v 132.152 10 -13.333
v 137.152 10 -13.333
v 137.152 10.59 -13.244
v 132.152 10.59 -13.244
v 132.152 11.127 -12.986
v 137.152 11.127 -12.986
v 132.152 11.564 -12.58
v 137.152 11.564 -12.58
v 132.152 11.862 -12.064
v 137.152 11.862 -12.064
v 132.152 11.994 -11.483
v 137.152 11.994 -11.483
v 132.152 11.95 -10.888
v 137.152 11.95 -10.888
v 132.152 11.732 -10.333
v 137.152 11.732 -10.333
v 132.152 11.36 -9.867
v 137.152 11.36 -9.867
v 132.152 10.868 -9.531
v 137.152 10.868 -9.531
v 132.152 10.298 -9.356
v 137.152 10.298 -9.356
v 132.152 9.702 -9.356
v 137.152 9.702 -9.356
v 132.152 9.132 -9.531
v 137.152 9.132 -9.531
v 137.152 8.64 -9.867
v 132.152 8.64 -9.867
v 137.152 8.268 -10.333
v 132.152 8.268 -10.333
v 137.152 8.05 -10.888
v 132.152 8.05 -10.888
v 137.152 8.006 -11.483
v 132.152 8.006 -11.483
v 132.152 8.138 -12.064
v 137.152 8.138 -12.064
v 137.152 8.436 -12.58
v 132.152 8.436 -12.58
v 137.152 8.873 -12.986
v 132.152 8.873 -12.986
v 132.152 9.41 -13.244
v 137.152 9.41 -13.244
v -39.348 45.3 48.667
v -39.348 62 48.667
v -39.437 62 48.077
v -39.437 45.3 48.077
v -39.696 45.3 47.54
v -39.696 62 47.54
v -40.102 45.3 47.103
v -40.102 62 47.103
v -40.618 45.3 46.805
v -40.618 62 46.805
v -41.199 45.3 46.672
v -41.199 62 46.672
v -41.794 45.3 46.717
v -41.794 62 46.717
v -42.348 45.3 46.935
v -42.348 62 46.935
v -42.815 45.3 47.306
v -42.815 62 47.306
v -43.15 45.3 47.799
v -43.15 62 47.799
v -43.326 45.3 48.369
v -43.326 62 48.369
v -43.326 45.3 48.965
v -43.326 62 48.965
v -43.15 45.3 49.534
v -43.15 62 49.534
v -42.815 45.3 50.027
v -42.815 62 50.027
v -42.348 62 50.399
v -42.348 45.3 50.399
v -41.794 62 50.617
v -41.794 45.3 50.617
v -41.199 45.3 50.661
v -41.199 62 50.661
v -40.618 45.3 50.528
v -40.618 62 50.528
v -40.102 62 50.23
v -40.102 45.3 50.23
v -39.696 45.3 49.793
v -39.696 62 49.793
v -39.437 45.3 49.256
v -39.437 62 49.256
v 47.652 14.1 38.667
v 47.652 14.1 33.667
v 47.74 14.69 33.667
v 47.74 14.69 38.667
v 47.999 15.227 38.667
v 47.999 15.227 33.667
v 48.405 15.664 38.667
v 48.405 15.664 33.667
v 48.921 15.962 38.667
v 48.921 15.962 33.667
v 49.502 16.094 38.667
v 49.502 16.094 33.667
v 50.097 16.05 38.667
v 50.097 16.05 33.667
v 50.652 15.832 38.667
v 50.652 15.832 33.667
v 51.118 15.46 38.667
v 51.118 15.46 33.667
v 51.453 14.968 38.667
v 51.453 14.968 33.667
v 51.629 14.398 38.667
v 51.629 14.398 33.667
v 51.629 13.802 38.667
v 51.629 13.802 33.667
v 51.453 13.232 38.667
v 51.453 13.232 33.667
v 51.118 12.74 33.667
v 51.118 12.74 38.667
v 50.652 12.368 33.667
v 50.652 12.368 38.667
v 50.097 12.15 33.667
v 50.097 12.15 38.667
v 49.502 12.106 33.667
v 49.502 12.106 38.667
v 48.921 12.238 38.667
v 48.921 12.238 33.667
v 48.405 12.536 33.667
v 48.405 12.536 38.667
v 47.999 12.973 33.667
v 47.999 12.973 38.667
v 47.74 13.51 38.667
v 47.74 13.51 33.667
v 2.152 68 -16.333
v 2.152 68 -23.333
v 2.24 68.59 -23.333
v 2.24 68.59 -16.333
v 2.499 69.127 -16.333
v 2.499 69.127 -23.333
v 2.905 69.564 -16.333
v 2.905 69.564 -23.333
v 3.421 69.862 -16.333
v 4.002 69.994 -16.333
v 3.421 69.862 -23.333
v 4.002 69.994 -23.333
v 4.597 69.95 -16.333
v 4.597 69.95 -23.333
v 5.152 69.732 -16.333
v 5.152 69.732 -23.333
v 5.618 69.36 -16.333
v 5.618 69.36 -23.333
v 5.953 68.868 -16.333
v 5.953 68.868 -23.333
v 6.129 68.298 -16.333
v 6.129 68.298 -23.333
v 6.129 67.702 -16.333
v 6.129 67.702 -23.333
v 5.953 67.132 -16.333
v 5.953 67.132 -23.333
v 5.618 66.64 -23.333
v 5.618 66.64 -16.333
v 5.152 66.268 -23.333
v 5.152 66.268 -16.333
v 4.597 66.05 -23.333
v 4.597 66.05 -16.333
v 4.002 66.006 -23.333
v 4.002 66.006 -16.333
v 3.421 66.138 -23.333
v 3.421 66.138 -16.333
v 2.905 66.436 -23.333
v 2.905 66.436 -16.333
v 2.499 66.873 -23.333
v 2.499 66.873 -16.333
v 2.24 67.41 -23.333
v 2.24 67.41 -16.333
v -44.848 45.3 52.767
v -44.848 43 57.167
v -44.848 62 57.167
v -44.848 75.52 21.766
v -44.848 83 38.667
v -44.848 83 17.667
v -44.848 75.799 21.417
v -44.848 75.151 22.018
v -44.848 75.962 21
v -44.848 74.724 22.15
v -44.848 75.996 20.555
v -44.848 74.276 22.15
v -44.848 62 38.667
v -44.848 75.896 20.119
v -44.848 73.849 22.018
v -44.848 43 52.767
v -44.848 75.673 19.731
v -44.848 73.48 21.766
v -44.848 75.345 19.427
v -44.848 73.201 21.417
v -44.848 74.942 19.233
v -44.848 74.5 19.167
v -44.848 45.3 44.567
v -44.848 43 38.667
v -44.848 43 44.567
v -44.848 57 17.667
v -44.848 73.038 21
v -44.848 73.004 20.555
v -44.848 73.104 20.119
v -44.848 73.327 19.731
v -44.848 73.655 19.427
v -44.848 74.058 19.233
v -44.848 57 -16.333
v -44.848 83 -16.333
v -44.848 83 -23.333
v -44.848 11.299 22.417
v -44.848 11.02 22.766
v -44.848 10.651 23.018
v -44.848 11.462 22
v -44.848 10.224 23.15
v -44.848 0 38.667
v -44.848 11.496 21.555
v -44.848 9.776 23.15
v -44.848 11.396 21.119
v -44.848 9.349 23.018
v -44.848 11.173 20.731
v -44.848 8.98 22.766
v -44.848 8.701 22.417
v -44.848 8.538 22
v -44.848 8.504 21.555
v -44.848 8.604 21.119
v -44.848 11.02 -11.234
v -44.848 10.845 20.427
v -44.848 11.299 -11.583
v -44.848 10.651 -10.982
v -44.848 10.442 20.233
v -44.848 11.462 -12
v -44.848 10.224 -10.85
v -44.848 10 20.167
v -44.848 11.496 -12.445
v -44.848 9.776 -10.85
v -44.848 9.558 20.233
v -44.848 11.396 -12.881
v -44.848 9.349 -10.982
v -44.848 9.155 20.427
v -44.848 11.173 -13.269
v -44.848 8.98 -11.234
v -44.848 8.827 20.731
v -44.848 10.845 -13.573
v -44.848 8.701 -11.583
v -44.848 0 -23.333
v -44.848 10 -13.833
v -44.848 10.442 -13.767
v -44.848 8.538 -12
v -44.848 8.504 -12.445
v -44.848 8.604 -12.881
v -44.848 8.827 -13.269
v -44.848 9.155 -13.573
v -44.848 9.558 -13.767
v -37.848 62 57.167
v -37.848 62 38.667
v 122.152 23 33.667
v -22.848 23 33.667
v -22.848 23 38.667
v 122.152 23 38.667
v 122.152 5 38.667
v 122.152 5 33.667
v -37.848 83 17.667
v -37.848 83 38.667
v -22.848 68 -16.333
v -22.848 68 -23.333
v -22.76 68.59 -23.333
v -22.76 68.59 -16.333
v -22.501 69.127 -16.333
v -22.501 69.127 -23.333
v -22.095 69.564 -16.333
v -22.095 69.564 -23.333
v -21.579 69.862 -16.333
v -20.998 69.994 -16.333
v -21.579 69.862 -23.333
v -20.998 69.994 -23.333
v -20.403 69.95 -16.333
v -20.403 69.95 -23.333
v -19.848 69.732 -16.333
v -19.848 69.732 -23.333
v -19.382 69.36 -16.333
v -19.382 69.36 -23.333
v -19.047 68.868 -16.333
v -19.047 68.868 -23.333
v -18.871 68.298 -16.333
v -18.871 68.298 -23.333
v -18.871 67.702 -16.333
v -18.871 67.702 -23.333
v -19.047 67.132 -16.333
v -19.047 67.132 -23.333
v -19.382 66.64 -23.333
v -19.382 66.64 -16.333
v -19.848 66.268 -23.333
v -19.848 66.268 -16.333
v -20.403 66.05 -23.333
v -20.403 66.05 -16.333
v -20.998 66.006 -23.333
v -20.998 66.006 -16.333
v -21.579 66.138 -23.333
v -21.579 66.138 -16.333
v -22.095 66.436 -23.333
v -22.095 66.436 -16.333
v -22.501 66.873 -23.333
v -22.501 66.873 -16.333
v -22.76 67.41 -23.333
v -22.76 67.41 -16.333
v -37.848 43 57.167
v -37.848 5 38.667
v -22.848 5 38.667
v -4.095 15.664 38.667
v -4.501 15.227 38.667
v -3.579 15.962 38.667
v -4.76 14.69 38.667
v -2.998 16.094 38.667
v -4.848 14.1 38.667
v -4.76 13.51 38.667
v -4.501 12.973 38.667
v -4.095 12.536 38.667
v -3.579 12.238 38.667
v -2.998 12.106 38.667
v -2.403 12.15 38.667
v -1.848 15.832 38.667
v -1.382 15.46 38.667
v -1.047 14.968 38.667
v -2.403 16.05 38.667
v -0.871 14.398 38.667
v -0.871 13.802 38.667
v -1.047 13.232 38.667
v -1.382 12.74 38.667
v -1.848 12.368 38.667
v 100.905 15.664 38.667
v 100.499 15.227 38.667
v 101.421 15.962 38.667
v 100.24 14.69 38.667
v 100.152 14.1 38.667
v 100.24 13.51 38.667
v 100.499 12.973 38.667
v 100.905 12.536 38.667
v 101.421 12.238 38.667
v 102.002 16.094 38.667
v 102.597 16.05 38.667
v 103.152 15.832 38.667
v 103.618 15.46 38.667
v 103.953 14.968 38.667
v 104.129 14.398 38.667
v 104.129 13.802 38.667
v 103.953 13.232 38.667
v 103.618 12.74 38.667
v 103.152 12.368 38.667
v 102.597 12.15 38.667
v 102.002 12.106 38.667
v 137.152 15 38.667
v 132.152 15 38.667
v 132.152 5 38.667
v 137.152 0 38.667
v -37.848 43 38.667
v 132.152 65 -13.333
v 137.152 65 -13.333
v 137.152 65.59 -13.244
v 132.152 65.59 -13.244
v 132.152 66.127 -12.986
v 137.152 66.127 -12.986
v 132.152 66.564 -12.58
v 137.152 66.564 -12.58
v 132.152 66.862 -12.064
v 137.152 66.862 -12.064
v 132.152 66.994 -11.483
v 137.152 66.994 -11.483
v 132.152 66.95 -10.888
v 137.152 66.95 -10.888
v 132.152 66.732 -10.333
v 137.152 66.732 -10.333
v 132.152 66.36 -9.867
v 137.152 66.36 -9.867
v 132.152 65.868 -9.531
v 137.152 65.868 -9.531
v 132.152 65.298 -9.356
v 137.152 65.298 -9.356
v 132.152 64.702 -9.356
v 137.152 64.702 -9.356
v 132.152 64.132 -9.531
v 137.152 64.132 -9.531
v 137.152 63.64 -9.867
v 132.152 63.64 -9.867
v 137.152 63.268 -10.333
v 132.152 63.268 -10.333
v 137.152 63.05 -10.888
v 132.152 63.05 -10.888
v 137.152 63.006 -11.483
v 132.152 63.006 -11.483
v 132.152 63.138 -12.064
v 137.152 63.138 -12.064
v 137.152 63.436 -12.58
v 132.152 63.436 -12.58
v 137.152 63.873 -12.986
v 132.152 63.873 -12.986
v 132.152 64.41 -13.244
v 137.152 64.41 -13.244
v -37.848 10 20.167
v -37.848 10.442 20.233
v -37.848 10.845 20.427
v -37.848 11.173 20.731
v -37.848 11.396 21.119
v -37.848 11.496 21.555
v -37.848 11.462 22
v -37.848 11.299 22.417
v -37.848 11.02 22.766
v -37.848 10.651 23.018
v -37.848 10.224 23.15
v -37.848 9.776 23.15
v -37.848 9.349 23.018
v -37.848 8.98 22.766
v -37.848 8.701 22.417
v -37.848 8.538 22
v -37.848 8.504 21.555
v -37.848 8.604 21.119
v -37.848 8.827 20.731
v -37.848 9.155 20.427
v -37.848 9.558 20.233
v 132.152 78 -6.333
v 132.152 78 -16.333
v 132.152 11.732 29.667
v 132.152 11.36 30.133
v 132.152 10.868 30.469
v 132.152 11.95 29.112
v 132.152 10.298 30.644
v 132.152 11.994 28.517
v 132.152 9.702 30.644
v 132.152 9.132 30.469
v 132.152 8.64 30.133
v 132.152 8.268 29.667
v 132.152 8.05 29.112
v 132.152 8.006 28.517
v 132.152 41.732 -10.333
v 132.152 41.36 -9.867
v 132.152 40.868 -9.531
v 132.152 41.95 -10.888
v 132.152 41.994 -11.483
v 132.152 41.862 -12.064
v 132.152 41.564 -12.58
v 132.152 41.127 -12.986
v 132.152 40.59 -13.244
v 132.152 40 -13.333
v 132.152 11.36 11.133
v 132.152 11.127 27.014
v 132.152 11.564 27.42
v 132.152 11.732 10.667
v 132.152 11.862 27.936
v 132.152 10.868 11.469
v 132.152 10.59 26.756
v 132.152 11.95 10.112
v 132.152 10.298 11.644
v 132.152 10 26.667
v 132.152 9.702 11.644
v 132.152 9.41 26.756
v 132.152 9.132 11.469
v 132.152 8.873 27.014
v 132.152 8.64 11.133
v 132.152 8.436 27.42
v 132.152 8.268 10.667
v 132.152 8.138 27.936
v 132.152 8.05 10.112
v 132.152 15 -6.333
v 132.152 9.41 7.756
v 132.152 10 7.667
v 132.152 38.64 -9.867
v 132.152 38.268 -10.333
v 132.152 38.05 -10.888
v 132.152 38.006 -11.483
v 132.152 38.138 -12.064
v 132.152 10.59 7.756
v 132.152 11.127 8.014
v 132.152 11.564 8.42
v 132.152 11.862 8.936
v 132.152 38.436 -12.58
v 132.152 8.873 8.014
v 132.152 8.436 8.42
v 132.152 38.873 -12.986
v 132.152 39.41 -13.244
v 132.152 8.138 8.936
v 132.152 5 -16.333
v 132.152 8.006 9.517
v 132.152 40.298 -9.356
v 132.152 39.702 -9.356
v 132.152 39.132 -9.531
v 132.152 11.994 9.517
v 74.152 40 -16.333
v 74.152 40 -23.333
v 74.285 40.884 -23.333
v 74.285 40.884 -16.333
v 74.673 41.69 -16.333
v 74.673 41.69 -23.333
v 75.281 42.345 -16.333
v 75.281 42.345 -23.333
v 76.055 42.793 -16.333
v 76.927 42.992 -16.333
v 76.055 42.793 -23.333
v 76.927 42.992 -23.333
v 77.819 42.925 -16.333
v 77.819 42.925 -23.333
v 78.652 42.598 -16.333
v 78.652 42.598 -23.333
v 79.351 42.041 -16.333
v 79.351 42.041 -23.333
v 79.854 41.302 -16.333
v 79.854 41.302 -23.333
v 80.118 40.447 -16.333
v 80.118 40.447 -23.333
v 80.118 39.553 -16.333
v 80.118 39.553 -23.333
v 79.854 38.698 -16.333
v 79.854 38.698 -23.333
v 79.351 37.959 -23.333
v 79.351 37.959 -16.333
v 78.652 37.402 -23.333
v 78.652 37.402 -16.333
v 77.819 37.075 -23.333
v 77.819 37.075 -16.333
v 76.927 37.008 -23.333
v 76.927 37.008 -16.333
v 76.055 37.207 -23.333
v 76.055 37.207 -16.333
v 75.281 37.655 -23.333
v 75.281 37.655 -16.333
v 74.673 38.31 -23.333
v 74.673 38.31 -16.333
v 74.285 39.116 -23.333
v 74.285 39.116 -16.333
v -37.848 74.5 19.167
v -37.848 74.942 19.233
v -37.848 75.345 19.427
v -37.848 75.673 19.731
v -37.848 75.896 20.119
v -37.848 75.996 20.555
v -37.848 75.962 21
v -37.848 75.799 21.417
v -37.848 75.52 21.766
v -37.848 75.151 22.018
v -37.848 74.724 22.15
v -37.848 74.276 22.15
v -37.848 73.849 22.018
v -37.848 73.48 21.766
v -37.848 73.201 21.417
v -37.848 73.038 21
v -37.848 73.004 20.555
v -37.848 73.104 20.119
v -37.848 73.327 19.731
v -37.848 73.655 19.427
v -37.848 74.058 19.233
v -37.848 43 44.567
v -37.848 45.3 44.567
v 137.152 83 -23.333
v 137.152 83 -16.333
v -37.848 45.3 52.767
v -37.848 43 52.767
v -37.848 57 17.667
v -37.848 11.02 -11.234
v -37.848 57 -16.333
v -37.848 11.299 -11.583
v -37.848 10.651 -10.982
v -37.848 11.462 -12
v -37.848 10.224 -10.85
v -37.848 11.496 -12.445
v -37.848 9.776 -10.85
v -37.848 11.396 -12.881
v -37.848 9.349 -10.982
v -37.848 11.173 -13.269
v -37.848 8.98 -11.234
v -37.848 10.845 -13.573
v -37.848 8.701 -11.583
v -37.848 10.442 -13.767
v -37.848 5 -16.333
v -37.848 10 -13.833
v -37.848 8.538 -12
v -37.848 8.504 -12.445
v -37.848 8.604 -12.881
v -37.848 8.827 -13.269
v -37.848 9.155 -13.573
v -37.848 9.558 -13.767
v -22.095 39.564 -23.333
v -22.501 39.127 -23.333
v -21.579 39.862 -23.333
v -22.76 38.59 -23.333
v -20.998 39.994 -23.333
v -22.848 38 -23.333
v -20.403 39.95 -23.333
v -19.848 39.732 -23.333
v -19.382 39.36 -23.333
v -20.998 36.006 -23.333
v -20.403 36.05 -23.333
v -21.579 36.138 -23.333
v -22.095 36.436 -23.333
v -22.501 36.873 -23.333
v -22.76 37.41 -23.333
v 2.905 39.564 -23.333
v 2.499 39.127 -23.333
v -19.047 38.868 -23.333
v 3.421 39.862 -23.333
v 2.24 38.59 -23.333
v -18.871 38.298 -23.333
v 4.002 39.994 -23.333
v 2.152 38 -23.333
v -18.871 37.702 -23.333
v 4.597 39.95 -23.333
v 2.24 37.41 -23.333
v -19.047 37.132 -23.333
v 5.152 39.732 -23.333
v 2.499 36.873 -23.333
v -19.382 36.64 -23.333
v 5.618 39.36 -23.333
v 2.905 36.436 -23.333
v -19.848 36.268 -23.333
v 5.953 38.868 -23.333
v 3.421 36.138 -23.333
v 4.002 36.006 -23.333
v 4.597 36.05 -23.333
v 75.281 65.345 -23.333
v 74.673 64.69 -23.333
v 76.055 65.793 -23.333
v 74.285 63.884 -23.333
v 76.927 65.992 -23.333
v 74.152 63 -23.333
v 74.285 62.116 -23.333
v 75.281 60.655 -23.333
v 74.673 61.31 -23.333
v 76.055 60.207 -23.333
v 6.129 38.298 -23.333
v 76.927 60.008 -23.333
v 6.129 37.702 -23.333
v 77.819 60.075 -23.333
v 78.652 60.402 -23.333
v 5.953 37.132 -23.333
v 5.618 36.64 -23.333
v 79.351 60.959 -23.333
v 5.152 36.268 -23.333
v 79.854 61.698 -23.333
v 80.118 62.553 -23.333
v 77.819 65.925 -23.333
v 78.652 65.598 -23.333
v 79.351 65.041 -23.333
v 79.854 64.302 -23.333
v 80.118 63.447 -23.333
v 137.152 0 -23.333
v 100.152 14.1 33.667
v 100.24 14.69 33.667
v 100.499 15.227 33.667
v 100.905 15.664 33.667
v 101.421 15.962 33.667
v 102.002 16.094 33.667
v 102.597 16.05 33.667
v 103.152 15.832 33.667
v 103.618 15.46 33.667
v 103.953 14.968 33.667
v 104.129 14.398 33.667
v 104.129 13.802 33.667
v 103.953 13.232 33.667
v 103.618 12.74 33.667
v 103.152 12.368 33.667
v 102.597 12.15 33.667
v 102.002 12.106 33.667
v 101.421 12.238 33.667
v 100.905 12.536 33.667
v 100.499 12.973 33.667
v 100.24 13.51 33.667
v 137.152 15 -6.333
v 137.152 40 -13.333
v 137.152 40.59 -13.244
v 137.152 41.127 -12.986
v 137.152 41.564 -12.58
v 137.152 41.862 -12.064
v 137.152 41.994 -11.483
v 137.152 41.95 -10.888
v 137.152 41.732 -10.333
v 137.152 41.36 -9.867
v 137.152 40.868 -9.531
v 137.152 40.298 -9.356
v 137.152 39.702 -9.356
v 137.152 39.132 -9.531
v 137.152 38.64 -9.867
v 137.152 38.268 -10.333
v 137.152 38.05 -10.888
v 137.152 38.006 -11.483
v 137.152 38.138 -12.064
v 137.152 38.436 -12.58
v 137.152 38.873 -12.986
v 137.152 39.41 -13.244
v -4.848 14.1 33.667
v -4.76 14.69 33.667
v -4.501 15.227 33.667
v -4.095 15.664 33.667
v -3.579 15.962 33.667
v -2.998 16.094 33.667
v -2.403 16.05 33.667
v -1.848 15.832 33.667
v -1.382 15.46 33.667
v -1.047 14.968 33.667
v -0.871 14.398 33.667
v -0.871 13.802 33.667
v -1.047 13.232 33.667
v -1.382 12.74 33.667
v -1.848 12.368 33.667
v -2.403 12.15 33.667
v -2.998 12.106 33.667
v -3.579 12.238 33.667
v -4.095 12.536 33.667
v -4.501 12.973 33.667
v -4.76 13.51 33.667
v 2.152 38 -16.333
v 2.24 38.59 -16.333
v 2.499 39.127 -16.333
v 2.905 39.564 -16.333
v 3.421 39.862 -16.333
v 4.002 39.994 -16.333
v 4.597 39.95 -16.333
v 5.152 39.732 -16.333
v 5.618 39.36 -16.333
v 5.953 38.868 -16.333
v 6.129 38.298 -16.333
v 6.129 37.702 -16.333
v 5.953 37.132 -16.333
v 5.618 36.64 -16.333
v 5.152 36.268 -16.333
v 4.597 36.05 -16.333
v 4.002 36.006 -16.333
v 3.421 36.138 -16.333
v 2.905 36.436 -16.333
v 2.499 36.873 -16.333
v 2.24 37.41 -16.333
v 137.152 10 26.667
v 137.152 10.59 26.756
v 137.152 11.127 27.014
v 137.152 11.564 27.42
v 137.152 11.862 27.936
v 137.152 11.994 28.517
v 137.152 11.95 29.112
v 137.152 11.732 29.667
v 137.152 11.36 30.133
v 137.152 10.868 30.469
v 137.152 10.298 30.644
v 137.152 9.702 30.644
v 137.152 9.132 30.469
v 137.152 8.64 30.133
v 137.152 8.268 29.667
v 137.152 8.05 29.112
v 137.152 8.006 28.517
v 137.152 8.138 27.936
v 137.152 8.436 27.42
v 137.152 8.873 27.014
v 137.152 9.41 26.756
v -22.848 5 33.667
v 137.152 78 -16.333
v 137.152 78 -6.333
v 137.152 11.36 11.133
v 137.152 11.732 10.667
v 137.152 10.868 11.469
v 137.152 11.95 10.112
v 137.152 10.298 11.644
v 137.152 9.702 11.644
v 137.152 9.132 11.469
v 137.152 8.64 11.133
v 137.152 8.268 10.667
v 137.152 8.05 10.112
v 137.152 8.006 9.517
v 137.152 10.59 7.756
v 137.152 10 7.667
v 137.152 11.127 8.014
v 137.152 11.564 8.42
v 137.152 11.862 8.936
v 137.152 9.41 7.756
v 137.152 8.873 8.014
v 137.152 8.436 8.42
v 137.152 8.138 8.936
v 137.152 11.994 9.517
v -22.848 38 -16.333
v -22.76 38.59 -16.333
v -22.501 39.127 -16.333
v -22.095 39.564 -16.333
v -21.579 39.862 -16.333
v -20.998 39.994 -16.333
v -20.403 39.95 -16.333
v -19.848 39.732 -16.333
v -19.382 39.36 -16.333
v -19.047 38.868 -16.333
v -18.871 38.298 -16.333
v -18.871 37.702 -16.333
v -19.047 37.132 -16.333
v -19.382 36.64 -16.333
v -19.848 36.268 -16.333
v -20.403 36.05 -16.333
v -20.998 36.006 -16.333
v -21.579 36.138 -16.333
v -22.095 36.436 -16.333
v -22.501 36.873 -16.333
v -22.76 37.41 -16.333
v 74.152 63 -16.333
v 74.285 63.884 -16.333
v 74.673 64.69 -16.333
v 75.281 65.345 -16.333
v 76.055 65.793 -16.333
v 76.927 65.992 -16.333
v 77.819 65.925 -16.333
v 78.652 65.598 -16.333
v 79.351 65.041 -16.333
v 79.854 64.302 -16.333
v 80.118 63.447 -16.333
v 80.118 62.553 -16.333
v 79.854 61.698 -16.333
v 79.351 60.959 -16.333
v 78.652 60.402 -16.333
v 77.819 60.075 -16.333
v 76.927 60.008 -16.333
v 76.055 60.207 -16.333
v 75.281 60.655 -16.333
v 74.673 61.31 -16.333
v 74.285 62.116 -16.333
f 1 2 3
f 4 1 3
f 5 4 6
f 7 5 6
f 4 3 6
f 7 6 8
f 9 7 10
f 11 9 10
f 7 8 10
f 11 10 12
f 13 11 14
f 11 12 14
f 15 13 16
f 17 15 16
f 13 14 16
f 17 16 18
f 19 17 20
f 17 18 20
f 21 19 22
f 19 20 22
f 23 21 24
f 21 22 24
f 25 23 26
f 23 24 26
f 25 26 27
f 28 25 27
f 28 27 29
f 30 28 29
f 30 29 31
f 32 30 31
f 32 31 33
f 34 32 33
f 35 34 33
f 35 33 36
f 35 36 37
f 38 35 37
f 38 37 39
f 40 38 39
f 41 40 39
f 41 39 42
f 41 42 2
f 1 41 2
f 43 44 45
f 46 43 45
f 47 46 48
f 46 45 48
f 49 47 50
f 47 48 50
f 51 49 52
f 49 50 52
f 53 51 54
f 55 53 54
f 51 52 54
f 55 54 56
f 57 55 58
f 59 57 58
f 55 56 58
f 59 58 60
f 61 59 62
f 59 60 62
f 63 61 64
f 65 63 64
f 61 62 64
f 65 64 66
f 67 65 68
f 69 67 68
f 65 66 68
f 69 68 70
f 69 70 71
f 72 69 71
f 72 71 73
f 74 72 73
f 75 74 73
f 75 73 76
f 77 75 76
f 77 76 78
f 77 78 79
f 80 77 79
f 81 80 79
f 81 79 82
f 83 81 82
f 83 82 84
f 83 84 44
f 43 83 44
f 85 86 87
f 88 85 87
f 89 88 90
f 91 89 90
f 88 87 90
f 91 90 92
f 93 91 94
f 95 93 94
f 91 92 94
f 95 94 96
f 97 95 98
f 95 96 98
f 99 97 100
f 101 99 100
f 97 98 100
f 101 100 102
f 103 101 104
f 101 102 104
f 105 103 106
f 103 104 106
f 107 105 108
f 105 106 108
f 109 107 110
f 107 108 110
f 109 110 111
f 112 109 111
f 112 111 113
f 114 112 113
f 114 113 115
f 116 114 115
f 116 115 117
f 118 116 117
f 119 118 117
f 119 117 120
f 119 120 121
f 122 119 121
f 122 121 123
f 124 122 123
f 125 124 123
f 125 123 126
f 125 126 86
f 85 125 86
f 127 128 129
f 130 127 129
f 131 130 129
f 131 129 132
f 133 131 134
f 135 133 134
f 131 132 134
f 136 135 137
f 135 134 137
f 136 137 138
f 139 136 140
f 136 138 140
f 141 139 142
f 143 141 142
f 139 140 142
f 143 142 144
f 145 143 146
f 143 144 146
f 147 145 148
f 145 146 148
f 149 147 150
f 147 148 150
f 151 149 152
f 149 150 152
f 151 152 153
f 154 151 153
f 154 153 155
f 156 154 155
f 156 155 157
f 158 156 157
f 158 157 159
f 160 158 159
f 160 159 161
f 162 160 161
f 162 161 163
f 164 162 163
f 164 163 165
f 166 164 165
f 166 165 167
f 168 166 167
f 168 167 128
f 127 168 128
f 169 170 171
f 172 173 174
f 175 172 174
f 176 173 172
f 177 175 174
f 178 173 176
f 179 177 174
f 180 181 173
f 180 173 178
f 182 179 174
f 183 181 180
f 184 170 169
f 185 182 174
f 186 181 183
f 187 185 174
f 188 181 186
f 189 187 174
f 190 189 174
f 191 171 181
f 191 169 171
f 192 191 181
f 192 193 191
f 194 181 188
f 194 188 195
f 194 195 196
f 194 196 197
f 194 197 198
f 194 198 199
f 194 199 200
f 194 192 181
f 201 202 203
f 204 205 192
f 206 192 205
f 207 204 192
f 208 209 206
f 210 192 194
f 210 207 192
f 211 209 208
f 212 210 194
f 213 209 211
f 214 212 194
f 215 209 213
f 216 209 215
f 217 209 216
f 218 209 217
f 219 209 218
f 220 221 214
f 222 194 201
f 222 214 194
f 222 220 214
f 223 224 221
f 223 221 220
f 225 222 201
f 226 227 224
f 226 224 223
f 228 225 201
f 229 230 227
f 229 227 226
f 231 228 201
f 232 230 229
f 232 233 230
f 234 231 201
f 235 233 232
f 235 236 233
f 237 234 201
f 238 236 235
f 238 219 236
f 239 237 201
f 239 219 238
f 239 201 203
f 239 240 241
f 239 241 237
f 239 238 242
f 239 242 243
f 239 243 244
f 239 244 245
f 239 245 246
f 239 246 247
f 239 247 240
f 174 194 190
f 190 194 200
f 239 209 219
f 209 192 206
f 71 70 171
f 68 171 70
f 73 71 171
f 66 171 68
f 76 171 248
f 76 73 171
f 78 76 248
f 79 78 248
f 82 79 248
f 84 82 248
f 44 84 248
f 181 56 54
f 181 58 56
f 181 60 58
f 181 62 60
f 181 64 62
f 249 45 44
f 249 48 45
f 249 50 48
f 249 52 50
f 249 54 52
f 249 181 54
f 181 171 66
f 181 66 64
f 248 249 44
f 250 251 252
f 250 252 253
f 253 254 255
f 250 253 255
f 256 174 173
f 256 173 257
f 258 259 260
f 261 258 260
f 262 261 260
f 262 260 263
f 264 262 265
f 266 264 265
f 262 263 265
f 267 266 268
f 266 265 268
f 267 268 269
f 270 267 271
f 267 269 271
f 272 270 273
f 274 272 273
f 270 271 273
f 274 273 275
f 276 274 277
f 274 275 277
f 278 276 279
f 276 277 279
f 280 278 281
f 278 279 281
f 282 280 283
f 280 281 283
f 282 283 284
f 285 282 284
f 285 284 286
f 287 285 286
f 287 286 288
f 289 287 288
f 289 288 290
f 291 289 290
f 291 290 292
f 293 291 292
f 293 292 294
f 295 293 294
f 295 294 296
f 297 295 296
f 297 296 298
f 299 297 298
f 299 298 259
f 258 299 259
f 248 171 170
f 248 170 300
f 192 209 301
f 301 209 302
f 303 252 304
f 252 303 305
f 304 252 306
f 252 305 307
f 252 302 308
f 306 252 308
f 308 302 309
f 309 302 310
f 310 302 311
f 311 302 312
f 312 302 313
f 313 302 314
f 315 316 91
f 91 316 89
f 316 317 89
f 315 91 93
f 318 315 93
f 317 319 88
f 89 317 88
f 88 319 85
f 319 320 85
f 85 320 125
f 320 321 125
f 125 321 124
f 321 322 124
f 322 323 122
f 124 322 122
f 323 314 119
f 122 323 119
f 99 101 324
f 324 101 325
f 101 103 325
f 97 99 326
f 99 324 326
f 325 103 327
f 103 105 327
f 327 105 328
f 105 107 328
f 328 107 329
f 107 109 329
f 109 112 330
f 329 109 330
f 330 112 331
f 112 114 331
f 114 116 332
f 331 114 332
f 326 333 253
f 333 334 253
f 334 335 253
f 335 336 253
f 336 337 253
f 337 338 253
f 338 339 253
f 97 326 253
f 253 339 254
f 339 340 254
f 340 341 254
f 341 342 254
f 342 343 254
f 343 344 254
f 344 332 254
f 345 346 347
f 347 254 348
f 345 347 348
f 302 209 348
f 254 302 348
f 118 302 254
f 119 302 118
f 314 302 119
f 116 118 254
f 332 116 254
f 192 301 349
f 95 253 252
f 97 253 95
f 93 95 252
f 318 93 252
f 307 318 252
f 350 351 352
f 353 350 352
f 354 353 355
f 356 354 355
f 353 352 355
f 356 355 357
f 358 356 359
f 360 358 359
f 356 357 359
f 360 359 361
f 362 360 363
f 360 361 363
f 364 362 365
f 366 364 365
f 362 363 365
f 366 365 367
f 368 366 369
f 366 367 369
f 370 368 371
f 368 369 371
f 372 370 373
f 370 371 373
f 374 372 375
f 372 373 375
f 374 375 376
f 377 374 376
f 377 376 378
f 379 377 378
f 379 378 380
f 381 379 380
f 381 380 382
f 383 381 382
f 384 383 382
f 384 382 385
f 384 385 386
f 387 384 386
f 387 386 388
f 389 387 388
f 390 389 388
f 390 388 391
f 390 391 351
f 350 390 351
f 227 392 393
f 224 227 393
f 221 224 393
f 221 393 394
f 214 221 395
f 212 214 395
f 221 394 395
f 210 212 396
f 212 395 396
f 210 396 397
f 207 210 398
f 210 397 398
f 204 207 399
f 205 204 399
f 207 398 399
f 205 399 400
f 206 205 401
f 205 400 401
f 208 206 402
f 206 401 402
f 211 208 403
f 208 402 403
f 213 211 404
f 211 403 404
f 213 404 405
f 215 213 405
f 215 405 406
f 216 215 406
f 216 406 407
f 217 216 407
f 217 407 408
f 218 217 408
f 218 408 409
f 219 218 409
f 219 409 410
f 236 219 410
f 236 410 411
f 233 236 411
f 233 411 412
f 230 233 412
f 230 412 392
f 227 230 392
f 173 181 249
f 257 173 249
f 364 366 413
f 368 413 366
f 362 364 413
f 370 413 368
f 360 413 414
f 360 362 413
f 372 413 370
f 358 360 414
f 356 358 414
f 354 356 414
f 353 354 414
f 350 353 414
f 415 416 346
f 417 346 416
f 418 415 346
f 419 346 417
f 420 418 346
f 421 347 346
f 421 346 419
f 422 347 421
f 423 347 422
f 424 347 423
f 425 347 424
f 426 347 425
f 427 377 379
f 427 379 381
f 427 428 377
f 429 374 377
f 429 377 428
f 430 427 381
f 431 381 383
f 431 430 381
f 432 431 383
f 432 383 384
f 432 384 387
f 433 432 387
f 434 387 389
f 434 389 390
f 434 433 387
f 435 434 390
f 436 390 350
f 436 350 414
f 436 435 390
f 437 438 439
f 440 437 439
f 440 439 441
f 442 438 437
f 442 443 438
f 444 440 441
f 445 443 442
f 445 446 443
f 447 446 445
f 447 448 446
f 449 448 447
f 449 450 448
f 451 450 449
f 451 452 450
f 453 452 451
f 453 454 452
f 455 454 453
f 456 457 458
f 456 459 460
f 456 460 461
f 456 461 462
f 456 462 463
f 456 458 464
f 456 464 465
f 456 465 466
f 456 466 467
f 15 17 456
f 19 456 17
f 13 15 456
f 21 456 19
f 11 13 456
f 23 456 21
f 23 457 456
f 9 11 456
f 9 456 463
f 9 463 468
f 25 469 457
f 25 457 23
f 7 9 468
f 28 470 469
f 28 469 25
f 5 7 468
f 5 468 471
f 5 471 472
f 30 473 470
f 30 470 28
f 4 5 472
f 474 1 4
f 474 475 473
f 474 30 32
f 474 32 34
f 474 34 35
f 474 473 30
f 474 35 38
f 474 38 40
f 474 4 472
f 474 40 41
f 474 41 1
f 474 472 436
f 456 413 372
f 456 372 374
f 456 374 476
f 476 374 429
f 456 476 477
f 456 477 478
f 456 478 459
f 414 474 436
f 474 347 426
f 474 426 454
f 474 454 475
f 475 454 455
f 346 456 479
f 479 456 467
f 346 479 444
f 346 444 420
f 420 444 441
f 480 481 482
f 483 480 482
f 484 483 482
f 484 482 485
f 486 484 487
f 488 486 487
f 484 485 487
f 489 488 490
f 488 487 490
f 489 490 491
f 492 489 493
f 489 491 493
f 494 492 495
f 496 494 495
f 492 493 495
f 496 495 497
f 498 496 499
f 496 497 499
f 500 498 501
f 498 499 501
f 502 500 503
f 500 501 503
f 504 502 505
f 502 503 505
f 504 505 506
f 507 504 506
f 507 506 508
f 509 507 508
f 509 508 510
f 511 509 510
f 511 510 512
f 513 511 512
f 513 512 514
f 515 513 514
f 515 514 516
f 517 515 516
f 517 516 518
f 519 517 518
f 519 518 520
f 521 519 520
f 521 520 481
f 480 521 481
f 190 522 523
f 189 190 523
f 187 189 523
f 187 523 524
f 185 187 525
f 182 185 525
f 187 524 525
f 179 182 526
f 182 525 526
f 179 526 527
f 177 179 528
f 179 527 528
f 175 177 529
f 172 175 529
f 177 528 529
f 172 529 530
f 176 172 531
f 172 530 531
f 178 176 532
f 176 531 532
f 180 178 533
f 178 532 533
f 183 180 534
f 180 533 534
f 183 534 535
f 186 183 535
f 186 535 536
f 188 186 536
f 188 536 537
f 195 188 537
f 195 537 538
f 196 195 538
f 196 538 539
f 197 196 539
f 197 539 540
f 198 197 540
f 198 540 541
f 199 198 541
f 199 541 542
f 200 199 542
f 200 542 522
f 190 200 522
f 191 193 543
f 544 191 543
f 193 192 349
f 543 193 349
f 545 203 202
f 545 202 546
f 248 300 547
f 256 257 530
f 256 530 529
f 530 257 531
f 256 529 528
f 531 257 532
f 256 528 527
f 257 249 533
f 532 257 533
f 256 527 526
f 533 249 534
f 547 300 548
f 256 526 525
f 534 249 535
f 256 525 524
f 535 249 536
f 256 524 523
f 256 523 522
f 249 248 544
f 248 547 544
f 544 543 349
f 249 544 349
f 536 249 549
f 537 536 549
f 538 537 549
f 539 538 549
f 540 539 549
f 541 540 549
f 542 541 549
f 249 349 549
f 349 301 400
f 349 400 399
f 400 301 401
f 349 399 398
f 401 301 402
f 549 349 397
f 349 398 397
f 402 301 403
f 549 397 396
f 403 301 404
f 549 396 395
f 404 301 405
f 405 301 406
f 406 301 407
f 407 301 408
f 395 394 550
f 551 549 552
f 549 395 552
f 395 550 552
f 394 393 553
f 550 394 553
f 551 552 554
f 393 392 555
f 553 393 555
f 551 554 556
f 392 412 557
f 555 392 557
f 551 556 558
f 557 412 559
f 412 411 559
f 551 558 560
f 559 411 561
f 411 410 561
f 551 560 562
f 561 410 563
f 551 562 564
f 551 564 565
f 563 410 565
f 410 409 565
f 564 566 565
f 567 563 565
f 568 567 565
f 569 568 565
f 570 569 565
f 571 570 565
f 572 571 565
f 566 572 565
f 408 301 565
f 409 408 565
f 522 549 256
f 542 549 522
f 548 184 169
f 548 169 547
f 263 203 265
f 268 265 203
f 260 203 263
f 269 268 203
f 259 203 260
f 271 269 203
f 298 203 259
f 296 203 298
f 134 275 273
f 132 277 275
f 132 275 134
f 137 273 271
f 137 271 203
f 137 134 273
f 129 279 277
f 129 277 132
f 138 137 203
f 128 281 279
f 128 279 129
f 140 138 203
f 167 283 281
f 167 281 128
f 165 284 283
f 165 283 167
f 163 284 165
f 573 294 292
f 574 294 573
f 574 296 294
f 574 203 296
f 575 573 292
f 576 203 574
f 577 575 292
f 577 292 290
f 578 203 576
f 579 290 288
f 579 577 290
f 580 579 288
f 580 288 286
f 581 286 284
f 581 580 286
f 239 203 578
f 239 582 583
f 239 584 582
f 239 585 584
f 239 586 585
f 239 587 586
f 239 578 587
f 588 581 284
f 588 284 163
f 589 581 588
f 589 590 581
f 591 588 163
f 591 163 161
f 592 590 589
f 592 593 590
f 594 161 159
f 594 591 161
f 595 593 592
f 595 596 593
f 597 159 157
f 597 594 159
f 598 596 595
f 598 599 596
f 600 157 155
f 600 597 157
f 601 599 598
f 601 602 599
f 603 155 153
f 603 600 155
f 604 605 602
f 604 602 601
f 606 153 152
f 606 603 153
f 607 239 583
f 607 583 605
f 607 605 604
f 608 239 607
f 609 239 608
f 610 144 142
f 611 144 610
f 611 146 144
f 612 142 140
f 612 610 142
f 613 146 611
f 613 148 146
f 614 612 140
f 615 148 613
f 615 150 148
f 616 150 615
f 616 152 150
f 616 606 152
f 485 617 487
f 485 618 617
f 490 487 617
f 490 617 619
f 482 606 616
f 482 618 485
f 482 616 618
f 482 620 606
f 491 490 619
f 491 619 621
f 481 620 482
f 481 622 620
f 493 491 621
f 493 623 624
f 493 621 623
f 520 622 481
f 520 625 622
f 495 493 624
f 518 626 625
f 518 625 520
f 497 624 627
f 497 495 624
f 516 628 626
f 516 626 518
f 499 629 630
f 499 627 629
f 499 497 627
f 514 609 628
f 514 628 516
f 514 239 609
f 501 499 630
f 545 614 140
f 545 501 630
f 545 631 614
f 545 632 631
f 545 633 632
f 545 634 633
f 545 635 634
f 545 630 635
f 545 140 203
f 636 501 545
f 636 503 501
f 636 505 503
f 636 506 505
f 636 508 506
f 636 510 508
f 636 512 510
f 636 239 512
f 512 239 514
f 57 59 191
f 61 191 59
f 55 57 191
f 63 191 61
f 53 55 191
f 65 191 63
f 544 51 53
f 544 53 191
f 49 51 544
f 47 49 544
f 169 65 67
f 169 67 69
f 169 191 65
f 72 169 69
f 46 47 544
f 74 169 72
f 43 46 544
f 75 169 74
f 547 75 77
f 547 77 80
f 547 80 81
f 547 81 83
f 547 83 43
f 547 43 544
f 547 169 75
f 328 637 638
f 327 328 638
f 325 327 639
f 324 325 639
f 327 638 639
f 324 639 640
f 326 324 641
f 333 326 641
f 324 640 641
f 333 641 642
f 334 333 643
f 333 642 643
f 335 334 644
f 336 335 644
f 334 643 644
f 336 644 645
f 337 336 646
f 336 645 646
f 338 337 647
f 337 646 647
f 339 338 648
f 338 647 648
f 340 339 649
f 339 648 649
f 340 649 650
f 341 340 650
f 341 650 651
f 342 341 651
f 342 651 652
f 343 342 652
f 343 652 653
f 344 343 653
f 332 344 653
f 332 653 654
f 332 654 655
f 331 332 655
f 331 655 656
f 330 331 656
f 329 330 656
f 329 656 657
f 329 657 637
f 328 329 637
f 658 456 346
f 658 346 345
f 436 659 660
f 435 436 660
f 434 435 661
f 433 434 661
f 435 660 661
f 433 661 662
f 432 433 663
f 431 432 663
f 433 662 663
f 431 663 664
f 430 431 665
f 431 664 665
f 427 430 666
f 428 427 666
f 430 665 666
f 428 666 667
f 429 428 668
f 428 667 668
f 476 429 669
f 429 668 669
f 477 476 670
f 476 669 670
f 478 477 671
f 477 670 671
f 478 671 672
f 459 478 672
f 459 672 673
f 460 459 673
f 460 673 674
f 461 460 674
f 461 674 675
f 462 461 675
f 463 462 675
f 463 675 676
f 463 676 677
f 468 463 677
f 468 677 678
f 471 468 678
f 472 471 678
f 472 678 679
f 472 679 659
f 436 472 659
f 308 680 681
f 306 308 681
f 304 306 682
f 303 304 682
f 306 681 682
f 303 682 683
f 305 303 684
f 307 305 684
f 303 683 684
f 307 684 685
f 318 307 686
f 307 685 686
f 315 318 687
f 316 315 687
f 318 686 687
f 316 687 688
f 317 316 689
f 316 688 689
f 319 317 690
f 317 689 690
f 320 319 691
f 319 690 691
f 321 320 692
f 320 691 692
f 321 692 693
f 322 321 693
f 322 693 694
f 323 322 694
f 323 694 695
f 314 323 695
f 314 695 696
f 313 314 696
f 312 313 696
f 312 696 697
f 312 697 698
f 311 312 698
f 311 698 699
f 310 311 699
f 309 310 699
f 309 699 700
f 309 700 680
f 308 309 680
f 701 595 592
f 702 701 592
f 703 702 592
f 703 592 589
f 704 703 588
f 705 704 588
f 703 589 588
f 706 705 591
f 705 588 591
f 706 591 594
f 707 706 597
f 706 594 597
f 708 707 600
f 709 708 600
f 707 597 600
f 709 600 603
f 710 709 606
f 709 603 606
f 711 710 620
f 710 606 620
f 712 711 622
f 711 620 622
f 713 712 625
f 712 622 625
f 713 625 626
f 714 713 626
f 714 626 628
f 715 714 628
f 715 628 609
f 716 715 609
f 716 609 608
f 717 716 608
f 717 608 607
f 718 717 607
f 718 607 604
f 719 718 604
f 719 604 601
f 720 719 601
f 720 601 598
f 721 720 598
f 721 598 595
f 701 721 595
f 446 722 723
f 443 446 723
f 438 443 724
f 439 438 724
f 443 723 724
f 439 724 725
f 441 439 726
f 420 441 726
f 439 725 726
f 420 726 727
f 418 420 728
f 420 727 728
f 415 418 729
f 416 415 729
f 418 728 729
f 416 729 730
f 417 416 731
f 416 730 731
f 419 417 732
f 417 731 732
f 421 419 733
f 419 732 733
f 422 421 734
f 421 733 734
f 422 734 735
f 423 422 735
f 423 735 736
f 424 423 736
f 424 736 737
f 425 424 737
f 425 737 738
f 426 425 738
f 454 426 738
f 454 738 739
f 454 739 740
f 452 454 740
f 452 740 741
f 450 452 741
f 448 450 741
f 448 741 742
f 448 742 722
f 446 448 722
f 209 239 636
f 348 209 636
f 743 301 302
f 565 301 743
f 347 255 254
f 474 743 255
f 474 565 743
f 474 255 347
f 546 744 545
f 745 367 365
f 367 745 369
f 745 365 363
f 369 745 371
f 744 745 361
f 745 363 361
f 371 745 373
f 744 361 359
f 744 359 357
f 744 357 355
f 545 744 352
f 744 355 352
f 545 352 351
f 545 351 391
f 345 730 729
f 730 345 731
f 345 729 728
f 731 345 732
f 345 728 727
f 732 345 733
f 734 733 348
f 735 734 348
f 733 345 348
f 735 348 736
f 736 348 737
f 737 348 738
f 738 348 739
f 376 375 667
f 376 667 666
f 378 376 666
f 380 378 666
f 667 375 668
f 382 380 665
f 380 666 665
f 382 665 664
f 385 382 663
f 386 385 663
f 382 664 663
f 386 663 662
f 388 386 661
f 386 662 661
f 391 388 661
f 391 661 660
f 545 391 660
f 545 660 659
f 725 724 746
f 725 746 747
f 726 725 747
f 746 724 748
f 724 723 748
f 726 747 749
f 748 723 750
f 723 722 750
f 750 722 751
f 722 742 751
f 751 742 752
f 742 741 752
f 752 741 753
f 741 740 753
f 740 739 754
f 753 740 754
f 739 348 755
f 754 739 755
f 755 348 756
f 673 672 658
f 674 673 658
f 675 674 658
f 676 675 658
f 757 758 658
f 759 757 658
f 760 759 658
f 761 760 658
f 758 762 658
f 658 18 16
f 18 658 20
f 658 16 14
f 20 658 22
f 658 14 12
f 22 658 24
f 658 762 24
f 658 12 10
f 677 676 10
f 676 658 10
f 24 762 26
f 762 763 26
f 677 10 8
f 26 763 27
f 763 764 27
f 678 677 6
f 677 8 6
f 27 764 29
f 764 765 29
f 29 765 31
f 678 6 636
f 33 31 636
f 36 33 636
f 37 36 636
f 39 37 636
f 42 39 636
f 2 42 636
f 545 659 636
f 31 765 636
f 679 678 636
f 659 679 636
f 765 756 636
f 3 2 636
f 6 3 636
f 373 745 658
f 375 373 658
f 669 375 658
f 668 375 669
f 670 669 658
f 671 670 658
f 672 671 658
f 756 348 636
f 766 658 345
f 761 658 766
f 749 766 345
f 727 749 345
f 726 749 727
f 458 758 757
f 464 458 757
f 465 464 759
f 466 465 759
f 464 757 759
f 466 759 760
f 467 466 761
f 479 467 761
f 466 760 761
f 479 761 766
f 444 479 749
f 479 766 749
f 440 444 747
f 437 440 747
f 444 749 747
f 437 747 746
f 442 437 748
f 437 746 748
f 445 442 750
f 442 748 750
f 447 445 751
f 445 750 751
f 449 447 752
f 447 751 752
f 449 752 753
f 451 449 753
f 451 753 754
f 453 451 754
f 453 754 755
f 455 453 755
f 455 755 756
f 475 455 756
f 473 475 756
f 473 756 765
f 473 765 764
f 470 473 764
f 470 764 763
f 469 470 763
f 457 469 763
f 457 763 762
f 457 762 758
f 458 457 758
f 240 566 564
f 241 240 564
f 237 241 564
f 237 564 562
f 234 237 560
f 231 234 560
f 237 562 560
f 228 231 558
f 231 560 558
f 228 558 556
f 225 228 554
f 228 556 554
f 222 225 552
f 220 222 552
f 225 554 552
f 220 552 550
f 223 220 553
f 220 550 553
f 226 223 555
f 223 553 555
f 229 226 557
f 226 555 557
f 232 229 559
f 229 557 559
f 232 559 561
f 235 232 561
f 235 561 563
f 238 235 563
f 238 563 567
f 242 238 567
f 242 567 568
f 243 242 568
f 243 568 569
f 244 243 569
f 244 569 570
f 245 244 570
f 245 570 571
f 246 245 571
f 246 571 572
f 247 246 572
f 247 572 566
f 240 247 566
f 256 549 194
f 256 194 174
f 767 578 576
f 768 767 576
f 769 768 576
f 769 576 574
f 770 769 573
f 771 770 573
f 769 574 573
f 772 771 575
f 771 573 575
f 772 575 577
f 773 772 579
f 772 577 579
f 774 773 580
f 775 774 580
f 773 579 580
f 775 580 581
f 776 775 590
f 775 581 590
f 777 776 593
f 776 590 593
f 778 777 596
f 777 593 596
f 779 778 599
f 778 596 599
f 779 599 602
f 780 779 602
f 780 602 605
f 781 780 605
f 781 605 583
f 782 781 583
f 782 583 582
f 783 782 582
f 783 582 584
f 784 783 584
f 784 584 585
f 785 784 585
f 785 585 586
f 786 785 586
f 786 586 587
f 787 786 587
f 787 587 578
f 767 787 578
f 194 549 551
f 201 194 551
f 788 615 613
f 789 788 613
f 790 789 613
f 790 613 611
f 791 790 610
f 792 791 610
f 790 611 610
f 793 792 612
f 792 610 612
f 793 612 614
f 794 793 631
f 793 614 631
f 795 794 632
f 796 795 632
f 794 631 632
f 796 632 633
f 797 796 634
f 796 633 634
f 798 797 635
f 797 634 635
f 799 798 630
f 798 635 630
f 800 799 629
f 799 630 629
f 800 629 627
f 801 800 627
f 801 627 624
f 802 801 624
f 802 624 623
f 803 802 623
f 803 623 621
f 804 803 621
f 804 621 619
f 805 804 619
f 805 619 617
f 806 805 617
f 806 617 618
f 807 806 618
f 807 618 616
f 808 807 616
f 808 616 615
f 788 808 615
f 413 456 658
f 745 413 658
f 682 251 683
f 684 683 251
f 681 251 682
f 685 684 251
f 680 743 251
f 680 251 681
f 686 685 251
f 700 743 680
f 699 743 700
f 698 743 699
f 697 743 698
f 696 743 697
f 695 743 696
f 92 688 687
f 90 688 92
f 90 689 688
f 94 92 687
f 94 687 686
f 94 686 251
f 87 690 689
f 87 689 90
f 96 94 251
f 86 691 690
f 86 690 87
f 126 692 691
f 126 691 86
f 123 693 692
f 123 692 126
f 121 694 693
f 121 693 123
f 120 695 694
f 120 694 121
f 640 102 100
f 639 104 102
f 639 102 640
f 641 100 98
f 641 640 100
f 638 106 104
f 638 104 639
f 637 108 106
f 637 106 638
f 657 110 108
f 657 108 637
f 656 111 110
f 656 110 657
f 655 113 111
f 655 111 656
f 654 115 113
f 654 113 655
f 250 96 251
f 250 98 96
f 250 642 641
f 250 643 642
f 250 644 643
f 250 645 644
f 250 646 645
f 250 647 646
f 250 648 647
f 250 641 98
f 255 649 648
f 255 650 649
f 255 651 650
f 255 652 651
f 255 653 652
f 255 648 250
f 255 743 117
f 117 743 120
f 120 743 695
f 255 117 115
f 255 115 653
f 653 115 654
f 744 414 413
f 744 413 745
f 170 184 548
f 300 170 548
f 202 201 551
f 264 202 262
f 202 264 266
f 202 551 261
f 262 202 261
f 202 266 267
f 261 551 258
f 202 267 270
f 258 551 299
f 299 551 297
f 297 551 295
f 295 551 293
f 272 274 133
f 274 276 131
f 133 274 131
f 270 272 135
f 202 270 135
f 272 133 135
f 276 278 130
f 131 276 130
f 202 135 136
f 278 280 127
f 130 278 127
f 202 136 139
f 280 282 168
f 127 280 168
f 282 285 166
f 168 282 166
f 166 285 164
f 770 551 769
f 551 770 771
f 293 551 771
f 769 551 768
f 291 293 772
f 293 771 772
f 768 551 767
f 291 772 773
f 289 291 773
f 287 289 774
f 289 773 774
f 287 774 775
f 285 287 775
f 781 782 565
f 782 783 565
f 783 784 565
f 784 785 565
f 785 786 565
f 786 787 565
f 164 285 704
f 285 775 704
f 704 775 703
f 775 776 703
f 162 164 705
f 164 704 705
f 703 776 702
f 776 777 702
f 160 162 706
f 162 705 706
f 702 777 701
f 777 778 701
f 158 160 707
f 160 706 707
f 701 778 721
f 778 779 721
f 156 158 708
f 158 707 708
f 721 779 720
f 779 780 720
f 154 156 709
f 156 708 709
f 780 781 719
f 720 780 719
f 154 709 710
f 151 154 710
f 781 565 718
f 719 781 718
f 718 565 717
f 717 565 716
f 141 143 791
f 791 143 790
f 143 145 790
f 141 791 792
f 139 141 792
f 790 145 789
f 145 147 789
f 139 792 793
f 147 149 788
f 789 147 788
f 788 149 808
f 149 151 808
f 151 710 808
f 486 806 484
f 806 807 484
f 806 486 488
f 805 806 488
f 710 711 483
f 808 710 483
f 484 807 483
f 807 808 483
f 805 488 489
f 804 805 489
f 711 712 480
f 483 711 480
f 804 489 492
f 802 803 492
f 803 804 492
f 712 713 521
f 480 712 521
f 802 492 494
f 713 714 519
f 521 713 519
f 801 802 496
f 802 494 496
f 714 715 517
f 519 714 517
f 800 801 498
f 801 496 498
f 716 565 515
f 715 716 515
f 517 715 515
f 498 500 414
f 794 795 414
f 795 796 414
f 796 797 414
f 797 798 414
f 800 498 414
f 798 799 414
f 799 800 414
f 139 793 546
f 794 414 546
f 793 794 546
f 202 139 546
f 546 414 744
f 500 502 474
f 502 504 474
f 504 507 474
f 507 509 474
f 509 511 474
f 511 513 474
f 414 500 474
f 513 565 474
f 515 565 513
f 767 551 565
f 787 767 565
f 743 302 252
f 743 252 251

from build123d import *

# Parameters (mm, degrees)
SKETCH1_W           = 182
SKETCH1_H           = 62
BOSS_EXTRUDE1_DEPTH = 5
SKETCH2_W           = 145
SKETCH2_H           = 5
BOSS_EXTRUDE2_DEPTH = 18
SKETCH3_R           = 2
CUT_EXTRUDE1_DEPTH  = 18
SKETCH4_W           = 7
SKETCH4_H           = 62
BOSS_EXTRUDE3_DEPTH = 78
SKETCH5_W           = 175
SKETCH5_H           = 7
BOSS_EXTRUDE4_DEPTH = 78
SKETCH6_W           = 7
SKETCH6_H           = 19
BOSS_EXTRUDE5_DEPTH = 18.5
SKETCH7_R           = 2
CUT_EXTRUDE2_DEPTH  = 18
SKETCH8_W           = 7
SKETCH8_H           = 8.2
CUT_EXTRUDE3_DEPTH  = 2.3
SKETCH11_R          = 1.5
SKETCH11_W          = 34
SKETCH11_H          = 26
CUT_EXTRUDE5_DEPTH  = 10
SKETCH12_W          = 5
SKETCH12_H          = 55
BOSS_EXTRUDE6_DEPTH = 10
SKETCH13_W          = 5
SKETCH13_H          = 10
BOSS_EXTRUDE7_DEPTH = 63
SKETCH15_R          = 2
CUT_EXTRUDE6_DEPTH  = 63
SKETCH16_R          = 3
CUT_EXTRUDE7_DEPTH  = 10
SKETCH17_R          = 2
CUT_EXTRUDE8_DEPTH  = 10
SKETCH18_R          = 1.5
CUT_EXTRUDE9_DEPTH  = 10


with BuildPart() as part:
    # Sketch1 → Boss-Extrude1 (new body)
    with BuildSketch(Plane(origin=(0, 0, 0), x_dir=(1, 0, 0), z_dir=(0, 1, 0))):
        with Locations((46.151515152, -7.666666667)):
            Rectangle(SKETCH1_W, SKETCH1_H)
    extrude(amount=BOSS_EXTRUDE1_DEPTH)

    # Sketch2 → Boss-Extrude2 (add)
    with BuildSketch(Plane(origin=(0, 5, 0), x_dir=(1, 0, 0), z_dir=(0, 1, 0))):
        with Locations((49.651515152, -36.166666667)):
            Rectangle(SKETCH2_W, SKETCH2_H)
    extrude(amount=BOSS_EXTRUDE2_DEPTH)

    # Sketch3 → Cut-Extrude1 (cut)
    with BuildSketch(Plane(origin=(0, 0, 33.666666667), x_dir=(-1, 0, 0), z_dir=(0, 0, -1))):
        with Locations((-102.151515152, 14.1)):
            Circle(SKETCH3_R)
        with Locations((-49.651515152, 14.1)):
            Circle(SKETCH3_R)
        with Locations((2.848484848, 14.1)):
            Circle(SKETCH3_R)
    extrude(amount=-CUT_EXTRUDE1_DEPTH, mode=Mode.SUBTRACT)

    # Sketch4 → Boss-Extrude3 (add)
    with BuildSketch(Plane(origin=(0, 5, 0), x_dir=(1, 0, 0), z_dir=(0, 1, 0))):
        with Locations((-41.348484848, -7.666666667)):
            Rectangle(SKETCH4_W, SKETCH4_H)
    extrude(amount=BOSS_EXTRUDE3_DEPTH)

    # Sketch5 → Boss-Extrude4 (add)
    with BuildSketch(Plane(origin=(0, 5, 0), x_dir=(1, 0, 0), z_dir=(0, 1, 0))):
        with Locations((49.651515152, 19.833333333)):
            Rectangle(SKETCH5_W, SKETCH5_H)
    extrude(amount=BOSS_EXTRUDE4_DEPTH)

    # Sketch6 → Boss-Extrude5 (add)
    with BuildSketch(Plane.XY.offset(38.666666667)):
        with Locations((-41.348484848, 52.5)):
            Rectangle(SKETCH6_W, SKETCH6_H)
    extrude(amount=BOSS_EXTRUDE5_DEPTH)

    # Sketch7 → Cut-Extrude2 (cut)
    with BuildSketch(Plane(origin=(0, 62, 0), x_dir=(1, 0, 0), z_dir=(0, 1, 0))):
        with Locations((-41.348484848, -48.666666667)):
            Circle(SKETCH7_R)
    extrude(amount=-CUT_EXTRUDE2_DEPTH, mode=Mode.SUBTRACT)

    # Sketch8 → Cut-Extrude3 (cut)
    with BuildSketch(Plane.XZ.offset(-43)):
        with Locations((-41.348484848, 48.666666667)):
            Rectangle(SKETCH8_W, SKETCH8_H)
    extrude(amount=-CUT_EXTRUDE3_DEPTH, mode=Mode.SUBTRACT)

    # Sketch11 → Cut-Extrude5 (cut)
    with BuildSketch(Plane(origin=(-37.848484848, 0, 0), x_dir=(0, 0, -1), z_dir=(1, 0, 0))):
        with Locations((-20.666666667, 74.5)):
            Circle(SKETCH11_R)
        with Locations((-0.666666667, 70)):
            Rectangle(SKETCH11_W, SKETCH11_H)
    extrude(amount=-CUT_EXTRUDE5_DEPTH, mode=Mode.SUBTRACT)

    # Sketch12 → Boss-Extrude6 (add)
    with BuildSketch(Plane(origin=(0, 5, 0), x_dir=(1, 0, 0), z_dir=(0, 1, 0))):
        with Locations((134.651515152, -11.166666667)):
            Rectangle(SKETCH12_W, SKETCH12_H)
    extrude(amount=BOSS_EXTRUDE6_DEPTH)

    # Sketch13 → Boss-Extrude7 (add)
    with BuildSketch(Plane(origin=(0, 15, 0), x_dir=(1, 0, 0), z_dir=(0, 1, 0))):
        with Locations((134.651515152, 11.333333333)):
            Rectangle(SKETCH13_W, SKETCH13_H)
    extrude(amount=BOSS_EXTRUDE7_DEPTH)

    # Sketch15 → Cut-Extrude6 (cut)
    with BuildSketch(Plane(origin=(137.151515152, 0, 0), x_dir=(0, 0, -1), z_dir=(1, 0, 0))):
        with Locations((11.333333333, 65)):
            Circle(SKETCH15_R)
        with Locations((11.333333333, 40)):
            Circle(SKETCH15_R)
        with Locations((11.333333333, 10)):
            Circle(SKETCH15_R)
        with Locations((-28.666666667, 10)):
            Circle(SKETCH15_R)
        with Locations((-9.666666667, 10)):
            Circle(SKETCH15_R)
    extrude(amount=-CUT_EXTRUDE6_DEPTH, mode=Mode.SUBTRACT)

    # Sketch16 → Cut-Extrude7 (cut)
    with BuildSketch(Plane(origin=(0, 0, -23.333333333), x_dir=(-1, 0, 0), z_dir=(0, 0, -1))):
        with Locations((-77.151515152, 40)):
            Circle(SKETCH16_R)
        with Locations((-77.151515152, 63)):
            Circle(SKETCH16_R)
    extrude(amount=-CUT_EXTRUDE7_DEPTH, mode=Mode.SUBTRACT)

    # Sketch17 → Cut-Extrude8 (cut)
    with BuildSketch(Plane(origin=(0, 0, -23.333333333), x_dir=(-1, 0, 0), z_dir=(0, 0, -1))):
        with Locations((20.848484848, 68)):
            Circle(SKETCH17_R)
        with Locations((20.848484848, 38)):
            Circle(SKETCH17_R)
        with Locations((-4.151515152, 38)):
            Circle(SKETCH17_R)
        with Locations((-4.151515152, 68)):
            Circle(SKETCH17_R)
    extrude(amount=-CUT_EXTRUDE8_DEPTH, mode=Mode.SUBTRACT)

    # Sketch18 → Cut-Extrude9 (cut)
    with BuildSketch(Plane(origin=(-37.848484848, 0, 0), x_dir=(0, 0, -1), z_dir=(1, 0, 0))):
        with Locations((12.333333333, 10)):
            Circle(SKETCH18_R)
        with Locations((-21.666666667, 10)):
            Circle(SKETCH18_R)
    extrude(amount=-CUT_EXTRUDE9_DEPTH, mode=Mode.SUBTRACT)


solid = part.part
